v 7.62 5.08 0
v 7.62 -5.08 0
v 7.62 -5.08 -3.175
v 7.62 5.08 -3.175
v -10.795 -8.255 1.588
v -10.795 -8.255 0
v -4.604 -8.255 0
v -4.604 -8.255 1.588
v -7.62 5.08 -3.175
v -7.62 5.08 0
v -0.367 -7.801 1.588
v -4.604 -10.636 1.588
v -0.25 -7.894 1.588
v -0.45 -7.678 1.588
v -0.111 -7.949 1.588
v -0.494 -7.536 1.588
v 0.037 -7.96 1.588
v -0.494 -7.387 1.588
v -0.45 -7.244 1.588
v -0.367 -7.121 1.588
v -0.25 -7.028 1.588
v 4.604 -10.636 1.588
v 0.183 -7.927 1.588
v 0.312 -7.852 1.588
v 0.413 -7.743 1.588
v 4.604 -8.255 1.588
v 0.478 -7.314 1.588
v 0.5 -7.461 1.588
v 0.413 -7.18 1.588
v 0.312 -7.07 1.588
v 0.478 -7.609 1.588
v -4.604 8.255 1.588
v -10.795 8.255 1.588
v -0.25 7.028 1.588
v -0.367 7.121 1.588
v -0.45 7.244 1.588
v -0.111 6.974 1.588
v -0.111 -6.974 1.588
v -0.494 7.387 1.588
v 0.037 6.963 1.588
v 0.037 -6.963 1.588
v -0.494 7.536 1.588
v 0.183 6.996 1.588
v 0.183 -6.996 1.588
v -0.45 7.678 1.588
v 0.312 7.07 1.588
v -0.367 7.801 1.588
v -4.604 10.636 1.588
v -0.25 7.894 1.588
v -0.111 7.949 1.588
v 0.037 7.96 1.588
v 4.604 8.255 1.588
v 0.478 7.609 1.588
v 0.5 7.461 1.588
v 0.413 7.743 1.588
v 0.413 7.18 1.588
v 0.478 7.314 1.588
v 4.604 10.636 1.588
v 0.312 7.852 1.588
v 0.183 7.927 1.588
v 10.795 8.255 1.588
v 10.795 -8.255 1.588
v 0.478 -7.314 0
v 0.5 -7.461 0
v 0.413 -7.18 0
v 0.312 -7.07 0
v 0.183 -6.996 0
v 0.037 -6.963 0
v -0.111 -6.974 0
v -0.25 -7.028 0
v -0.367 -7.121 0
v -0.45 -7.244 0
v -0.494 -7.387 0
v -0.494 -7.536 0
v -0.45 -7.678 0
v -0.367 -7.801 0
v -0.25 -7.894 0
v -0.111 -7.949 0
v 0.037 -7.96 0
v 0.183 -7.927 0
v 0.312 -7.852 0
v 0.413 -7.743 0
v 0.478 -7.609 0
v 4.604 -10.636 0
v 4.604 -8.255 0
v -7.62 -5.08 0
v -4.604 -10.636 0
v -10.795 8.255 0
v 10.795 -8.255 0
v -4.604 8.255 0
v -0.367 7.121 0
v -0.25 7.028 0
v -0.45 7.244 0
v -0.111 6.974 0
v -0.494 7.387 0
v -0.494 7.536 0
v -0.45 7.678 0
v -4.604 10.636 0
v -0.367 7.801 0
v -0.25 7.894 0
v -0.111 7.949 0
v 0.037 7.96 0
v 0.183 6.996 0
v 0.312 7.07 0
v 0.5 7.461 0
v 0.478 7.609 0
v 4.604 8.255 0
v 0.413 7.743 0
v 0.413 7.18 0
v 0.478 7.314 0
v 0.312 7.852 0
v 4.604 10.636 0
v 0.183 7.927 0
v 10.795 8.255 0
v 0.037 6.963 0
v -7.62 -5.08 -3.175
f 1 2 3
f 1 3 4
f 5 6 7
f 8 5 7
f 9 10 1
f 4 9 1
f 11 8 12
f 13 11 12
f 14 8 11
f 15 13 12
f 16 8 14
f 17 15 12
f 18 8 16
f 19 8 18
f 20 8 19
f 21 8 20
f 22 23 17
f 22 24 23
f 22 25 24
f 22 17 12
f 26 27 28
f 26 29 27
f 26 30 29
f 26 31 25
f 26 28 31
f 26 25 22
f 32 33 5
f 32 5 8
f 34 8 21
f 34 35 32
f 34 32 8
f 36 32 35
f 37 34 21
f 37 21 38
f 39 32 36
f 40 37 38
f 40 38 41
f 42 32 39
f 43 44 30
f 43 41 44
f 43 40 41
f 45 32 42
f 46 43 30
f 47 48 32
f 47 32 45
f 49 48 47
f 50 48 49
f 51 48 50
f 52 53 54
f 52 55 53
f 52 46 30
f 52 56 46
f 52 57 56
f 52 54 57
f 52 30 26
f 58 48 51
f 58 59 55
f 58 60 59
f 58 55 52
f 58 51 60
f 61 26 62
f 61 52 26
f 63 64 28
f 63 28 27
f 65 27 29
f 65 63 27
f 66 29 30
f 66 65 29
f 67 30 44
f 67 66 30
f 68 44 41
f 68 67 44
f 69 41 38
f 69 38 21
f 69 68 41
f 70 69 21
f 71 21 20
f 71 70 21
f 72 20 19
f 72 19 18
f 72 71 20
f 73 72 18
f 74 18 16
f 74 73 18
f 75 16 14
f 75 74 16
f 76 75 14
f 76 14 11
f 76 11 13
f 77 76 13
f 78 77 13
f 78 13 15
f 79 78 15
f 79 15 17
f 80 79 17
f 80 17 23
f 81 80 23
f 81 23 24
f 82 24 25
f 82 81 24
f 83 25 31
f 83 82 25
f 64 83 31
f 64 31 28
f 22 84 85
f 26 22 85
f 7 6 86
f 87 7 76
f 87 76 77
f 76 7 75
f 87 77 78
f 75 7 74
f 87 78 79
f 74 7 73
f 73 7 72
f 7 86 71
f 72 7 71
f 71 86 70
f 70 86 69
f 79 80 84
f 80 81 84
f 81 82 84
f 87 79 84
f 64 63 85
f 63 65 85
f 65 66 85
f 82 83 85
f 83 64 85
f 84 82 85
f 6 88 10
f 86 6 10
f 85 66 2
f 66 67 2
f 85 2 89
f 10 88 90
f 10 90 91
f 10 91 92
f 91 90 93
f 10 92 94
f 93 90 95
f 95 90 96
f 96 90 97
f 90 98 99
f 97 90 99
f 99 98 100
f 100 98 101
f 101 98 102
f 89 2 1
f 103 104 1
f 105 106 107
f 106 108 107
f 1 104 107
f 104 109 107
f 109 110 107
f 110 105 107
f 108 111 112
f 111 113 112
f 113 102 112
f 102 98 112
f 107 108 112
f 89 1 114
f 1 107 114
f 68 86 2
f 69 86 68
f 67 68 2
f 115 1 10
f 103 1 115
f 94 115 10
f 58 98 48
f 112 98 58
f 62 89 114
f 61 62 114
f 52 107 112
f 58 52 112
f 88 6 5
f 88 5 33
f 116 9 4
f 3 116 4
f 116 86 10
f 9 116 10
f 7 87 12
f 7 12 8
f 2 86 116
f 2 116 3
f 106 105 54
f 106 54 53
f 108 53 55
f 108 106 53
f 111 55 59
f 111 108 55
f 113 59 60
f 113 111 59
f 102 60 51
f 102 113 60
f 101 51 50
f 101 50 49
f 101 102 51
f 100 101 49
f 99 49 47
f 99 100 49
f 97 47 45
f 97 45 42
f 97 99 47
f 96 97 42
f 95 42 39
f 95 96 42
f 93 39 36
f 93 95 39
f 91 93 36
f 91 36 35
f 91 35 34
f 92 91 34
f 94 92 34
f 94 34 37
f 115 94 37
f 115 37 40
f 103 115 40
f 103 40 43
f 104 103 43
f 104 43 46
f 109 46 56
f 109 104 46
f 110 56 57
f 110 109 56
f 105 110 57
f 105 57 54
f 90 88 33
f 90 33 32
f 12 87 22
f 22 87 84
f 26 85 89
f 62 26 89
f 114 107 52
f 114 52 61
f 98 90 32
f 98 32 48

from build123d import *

# Parameters (mm, degrees)
SKETCH1_R           = 0.5
BOSS_EXTRUDE1_DEPTH = 1.5875
SKETCH1_3_W         = 15.24
SKETCH1_3_H         = 10.16
BOSS_EXTRUDE2_DEPTH = 3.175


with BuildPart() as part:
    # Sketch1 → Boss-Extrude1 (new body)
    with BuildSketch(Plane.XY):
        Polygon((4.60375, -8.255), (10.795, -8.255), (10.795, 8.255), (4.60375, 8.255), (4.60375, 10.63625), (-4.60375, 10.63625), (-4.60375, 8.255), (-10.795, 8.255), (-10.795, -8.255), (-4.60375, -8.255), (-4.60375, -10.63625), (4.60375, -10.63625), align=None)
        with Locations((0, -7.46125)):
            Circle(SKETCH1_R, mode=Mode.SUBTRACT)
        with Locations((0, 7.46125)):
            Circle(SKETCH1_R, mode=Mode.SUBTRACT)
    extrude(amount=BOSS_EXTRUDE1_DEPTH)

    # Sketch1<3> → Boss-Extrude2 (add)
    with BuildSketch(Plane.XY):
        Rectangle(SKETCH1_3_W, SKETCH1_3_H)
    extrude(amount=-BOSS_EXTRUDE2_DEPTH)


solid = part.part
